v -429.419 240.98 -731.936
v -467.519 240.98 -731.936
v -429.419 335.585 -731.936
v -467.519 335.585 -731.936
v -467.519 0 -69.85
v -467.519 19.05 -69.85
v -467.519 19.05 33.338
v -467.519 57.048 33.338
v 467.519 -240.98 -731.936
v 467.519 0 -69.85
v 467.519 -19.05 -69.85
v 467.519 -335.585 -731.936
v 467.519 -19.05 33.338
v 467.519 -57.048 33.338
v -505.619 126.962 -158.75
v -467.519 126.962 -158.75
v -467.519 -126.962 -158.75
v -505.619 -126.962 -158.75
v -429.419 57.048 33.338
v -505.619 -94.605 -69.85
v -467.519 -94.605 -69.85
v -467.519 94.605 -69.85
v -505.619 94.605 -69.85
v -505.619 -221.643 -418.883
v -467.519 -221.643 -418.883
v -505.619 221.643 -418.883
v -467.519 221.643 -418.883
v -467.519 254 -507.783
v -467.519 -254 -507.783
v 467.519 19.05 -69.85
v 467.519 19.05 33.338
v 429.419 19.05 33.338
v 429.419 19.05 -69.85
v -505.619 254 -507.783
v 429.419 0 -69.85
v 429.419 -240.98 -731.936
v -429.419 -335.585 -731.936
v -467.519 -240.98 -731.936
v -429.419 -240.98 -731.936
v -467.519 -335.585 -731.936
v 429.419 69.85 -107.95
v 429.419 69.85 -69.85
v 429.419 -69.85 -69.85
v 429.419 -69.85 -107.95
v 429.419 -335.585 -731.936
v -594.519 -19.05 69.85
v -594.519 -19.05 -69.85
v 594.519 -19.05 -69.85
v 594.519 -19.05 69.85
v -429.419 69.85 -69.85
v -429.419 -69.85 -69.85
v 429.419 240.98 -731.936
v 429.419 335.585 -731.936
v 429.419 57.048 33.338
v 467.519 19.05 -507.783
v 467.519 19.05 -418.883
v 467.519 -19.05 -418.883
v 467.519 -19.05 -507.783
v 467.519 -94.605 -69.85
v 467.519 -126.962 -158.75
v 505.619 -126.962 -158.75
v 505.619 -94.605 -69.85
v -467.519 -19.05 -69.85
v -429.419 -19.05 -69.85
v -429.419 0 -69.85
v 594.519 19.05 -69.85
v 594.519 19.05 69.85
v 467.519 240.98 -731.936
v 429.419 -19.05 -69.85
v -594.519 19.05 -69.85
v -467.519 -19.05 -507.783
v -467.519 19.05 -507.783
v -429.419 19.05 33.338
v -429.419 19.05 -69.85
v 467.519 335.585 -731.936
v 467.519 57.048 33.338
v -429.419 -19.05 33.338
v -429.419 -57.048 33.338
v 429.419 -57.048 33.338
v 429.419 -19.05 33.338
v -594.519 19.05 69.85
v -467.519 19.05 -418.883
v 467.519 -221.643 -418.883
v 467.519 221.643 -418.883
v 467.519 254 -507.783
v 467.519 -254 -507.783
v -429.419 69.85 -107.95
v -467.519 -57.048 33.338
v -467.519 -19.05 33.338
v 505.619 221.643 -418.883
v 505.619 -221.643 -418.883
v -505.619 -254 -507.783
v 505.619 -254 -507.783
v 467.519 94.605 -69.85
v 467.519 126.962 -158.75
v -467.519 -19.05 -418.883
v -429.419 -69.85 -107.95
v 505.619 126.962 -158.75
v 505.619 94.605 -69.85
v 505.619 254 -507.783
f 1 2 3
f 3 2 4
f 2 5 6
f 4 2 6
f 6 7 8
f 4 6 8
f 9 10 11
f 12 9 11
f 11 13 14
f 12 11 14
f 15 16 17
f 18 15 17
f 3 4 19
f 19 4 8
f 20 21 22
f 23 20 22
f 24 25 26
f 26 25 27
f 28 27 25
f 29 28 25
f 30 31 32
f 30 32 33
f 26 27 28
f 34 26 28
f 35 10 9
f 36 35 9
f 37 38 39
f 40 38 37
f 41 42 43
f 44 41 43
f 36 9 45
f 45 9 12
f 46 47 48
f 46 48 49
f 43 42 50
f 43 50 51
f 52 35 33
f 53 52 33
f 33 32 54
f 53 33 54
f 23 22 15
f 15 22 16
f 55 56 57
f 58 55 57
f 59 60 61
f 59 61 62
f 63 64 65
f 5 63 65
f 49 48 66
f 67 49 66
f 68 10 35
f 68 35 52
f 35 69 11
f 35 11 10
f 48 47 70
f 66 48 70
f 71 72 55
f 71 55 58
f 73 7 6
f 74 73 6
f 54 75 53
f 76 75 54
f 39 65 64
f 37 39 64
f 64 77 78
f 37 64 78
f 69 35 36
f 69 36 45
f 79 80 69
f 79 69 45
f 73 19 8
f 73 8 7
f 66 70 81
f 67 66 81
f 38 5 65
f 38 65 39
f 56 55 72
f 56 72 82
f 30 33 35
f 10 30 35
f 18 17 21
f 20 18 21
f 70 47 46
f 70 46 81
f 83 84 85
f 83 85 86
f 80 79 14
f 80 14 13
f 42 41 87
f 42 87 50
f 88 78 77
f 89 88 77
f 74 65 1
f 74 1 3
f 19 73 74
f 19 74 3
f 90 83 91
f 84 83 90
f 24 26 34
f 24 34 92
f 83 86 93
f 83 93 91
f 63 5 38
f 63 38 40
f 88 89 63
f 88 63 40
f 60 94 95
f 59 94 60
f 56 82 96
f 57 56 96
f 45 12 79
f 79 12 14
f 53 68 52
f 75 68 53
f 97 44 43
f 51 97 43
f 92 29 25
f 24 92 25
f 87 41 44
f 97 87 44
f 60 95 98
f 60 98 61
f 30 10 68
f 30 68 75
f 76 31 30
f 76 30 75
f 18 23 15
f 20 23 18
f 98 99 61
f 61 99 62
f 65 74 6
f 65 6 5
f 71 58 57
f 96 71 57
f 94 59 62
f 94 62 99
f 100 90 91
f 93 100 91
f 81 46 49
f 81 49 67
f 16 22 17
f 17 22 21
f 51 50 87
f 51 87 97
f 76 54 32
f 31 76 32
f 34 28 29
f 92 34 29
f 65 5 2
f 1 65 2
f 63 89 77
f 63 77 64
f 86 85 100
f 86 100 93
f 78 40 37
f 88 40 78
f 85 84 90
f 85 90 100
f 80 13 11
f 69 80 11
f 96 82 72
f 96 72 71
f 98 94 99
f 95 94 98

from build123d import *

# Parameters (mm, degrees)
F0_W      = 38.1
F0_H      = 139.7
F1_DEPTH  = 594.51875
F4_DEPTH  = 38.1
F8_DEPTH  = 38.1
F9_DEPTH  = 38.1
F11_W     = 139.7
F11_H     = 38.1
F12_DEPTH = 858.8375
F13_W     = 38.1
F13_H     = 88.9
F14_DEPTH = 935.0375


with BuildPart() as f1:
    # F0 (on Right) → F1 (new body, symmetric)
    with BuildSketch(Plane.YZ):
        Rectangle(F0_W, F0_H)
    extrude(amount=F1_DEPTH, both=True)


with BuildPart() as f4:
    # F3 (on offset) → F4 (new body)
    with BuildSketch(Plane(origin=(-467.51875, 0, 0), x_dir=(0, -1, 0), z_dir=(-1, 0, 0))):
        Polygon((19.05, -69.85), (0, -69.85), (240.9797509243, -731.9364242103), (335.5851548974, -731.9364242103), (57.0482254248, 33.3375), (19.05, 33.3375), align=None)
    extrude(amount=-F4_DEPTH)


with BuildPart() as f5_1:
    # F5: instance of F4
    add(f4.part.mirror(Plane.YZ))


with BuildPart() as f6_1:
    # F6: instance of F4
    add(f4.part.mirror(Plane.XZ))


with BuildPart() as f6_2:
    # F6: instance of F5_1
    add(f5_1.part.mirror(Plane.XZ))


with BuildPart() as f8:
    # F7 (on face) → F8 (new body)
    with BuildSketch(Plane(origin=(-467.51875, 0, 0), x_dir=(0, -1, 0), z_dir=(-1, 0, 0))):
        Polygon((-19.05, -69.85), (-94.6054039731, -69.85), (-126.9623577994, -158.75), (-32.3569538263, -158.75), (0, -69.85), align=None)
        Polygon((0, -69.85), (-32.3569538263, -158.75), (126.9623577994, -158.75), (94.6054039731, -69.85), align=None)
    extrude(amount=F8_DEPTH)


with BuildPart() as f9:
    # F7 (on face) → F9 (new body)
    with BuildSketch(Plane(origin=(-467.51875, 0, 0), x_dir=(0, -1, 0), z_dir=(-1, 0, 0))):
        Polygon((-127.0376422006, -418.883053367), (-221.6430461737, -418.883053367), (-254, -507.783053367), (-159.3945960269, -507.783053367), align=None)
        Polygon((221.6430461737, -418.883053367), (-127.0376422006, -418.883053367), (-159.3945960269, -507.783053367), (254, -507.783053367), align=None)
    extrude(amount=F9_DEPTH)


with BuildPart() as f10_1:
    # F10: instance of F8
    add(f8.part.mirror(Plane.YZ))


with BuildPart() as f10_2:
    # F10: instance of F9
    add(f9.part.mirror(Plane.YZ))


with BuildPart() as f12:
    # F11 (on face) → F12 (new body, through all)
    with BuildSketch(Plane(origin=(429.41875, 0, 0), x_dir=(0, -1, 0), z_dir=(-1, 0, 0))):
        with Locations((0, -88.9)):
            Rectangle(F11_W, F11_H)
    extrude(amount=F12_DEPTH)


with BuildPart() as f14:
    # F13 (on face) → F14 (new body, through all)
    with BuildSketch(Plane(origin=(467.51875, 0, 0), x_dir=(0, -1, 0), z_dir=(-1, 0, 0))):
        with Locations((0, -463.333053367)):
            Rectangle(F13_W, F13_H)
    extrude(amount=F14_DEPTH)


solid = Compound([f1.part, f4.part, f5_1.part, f6_1.part, f6_2.part, f8.part, f9.part, f10_1.part, f10_2.part, f12.part, f14.part])
